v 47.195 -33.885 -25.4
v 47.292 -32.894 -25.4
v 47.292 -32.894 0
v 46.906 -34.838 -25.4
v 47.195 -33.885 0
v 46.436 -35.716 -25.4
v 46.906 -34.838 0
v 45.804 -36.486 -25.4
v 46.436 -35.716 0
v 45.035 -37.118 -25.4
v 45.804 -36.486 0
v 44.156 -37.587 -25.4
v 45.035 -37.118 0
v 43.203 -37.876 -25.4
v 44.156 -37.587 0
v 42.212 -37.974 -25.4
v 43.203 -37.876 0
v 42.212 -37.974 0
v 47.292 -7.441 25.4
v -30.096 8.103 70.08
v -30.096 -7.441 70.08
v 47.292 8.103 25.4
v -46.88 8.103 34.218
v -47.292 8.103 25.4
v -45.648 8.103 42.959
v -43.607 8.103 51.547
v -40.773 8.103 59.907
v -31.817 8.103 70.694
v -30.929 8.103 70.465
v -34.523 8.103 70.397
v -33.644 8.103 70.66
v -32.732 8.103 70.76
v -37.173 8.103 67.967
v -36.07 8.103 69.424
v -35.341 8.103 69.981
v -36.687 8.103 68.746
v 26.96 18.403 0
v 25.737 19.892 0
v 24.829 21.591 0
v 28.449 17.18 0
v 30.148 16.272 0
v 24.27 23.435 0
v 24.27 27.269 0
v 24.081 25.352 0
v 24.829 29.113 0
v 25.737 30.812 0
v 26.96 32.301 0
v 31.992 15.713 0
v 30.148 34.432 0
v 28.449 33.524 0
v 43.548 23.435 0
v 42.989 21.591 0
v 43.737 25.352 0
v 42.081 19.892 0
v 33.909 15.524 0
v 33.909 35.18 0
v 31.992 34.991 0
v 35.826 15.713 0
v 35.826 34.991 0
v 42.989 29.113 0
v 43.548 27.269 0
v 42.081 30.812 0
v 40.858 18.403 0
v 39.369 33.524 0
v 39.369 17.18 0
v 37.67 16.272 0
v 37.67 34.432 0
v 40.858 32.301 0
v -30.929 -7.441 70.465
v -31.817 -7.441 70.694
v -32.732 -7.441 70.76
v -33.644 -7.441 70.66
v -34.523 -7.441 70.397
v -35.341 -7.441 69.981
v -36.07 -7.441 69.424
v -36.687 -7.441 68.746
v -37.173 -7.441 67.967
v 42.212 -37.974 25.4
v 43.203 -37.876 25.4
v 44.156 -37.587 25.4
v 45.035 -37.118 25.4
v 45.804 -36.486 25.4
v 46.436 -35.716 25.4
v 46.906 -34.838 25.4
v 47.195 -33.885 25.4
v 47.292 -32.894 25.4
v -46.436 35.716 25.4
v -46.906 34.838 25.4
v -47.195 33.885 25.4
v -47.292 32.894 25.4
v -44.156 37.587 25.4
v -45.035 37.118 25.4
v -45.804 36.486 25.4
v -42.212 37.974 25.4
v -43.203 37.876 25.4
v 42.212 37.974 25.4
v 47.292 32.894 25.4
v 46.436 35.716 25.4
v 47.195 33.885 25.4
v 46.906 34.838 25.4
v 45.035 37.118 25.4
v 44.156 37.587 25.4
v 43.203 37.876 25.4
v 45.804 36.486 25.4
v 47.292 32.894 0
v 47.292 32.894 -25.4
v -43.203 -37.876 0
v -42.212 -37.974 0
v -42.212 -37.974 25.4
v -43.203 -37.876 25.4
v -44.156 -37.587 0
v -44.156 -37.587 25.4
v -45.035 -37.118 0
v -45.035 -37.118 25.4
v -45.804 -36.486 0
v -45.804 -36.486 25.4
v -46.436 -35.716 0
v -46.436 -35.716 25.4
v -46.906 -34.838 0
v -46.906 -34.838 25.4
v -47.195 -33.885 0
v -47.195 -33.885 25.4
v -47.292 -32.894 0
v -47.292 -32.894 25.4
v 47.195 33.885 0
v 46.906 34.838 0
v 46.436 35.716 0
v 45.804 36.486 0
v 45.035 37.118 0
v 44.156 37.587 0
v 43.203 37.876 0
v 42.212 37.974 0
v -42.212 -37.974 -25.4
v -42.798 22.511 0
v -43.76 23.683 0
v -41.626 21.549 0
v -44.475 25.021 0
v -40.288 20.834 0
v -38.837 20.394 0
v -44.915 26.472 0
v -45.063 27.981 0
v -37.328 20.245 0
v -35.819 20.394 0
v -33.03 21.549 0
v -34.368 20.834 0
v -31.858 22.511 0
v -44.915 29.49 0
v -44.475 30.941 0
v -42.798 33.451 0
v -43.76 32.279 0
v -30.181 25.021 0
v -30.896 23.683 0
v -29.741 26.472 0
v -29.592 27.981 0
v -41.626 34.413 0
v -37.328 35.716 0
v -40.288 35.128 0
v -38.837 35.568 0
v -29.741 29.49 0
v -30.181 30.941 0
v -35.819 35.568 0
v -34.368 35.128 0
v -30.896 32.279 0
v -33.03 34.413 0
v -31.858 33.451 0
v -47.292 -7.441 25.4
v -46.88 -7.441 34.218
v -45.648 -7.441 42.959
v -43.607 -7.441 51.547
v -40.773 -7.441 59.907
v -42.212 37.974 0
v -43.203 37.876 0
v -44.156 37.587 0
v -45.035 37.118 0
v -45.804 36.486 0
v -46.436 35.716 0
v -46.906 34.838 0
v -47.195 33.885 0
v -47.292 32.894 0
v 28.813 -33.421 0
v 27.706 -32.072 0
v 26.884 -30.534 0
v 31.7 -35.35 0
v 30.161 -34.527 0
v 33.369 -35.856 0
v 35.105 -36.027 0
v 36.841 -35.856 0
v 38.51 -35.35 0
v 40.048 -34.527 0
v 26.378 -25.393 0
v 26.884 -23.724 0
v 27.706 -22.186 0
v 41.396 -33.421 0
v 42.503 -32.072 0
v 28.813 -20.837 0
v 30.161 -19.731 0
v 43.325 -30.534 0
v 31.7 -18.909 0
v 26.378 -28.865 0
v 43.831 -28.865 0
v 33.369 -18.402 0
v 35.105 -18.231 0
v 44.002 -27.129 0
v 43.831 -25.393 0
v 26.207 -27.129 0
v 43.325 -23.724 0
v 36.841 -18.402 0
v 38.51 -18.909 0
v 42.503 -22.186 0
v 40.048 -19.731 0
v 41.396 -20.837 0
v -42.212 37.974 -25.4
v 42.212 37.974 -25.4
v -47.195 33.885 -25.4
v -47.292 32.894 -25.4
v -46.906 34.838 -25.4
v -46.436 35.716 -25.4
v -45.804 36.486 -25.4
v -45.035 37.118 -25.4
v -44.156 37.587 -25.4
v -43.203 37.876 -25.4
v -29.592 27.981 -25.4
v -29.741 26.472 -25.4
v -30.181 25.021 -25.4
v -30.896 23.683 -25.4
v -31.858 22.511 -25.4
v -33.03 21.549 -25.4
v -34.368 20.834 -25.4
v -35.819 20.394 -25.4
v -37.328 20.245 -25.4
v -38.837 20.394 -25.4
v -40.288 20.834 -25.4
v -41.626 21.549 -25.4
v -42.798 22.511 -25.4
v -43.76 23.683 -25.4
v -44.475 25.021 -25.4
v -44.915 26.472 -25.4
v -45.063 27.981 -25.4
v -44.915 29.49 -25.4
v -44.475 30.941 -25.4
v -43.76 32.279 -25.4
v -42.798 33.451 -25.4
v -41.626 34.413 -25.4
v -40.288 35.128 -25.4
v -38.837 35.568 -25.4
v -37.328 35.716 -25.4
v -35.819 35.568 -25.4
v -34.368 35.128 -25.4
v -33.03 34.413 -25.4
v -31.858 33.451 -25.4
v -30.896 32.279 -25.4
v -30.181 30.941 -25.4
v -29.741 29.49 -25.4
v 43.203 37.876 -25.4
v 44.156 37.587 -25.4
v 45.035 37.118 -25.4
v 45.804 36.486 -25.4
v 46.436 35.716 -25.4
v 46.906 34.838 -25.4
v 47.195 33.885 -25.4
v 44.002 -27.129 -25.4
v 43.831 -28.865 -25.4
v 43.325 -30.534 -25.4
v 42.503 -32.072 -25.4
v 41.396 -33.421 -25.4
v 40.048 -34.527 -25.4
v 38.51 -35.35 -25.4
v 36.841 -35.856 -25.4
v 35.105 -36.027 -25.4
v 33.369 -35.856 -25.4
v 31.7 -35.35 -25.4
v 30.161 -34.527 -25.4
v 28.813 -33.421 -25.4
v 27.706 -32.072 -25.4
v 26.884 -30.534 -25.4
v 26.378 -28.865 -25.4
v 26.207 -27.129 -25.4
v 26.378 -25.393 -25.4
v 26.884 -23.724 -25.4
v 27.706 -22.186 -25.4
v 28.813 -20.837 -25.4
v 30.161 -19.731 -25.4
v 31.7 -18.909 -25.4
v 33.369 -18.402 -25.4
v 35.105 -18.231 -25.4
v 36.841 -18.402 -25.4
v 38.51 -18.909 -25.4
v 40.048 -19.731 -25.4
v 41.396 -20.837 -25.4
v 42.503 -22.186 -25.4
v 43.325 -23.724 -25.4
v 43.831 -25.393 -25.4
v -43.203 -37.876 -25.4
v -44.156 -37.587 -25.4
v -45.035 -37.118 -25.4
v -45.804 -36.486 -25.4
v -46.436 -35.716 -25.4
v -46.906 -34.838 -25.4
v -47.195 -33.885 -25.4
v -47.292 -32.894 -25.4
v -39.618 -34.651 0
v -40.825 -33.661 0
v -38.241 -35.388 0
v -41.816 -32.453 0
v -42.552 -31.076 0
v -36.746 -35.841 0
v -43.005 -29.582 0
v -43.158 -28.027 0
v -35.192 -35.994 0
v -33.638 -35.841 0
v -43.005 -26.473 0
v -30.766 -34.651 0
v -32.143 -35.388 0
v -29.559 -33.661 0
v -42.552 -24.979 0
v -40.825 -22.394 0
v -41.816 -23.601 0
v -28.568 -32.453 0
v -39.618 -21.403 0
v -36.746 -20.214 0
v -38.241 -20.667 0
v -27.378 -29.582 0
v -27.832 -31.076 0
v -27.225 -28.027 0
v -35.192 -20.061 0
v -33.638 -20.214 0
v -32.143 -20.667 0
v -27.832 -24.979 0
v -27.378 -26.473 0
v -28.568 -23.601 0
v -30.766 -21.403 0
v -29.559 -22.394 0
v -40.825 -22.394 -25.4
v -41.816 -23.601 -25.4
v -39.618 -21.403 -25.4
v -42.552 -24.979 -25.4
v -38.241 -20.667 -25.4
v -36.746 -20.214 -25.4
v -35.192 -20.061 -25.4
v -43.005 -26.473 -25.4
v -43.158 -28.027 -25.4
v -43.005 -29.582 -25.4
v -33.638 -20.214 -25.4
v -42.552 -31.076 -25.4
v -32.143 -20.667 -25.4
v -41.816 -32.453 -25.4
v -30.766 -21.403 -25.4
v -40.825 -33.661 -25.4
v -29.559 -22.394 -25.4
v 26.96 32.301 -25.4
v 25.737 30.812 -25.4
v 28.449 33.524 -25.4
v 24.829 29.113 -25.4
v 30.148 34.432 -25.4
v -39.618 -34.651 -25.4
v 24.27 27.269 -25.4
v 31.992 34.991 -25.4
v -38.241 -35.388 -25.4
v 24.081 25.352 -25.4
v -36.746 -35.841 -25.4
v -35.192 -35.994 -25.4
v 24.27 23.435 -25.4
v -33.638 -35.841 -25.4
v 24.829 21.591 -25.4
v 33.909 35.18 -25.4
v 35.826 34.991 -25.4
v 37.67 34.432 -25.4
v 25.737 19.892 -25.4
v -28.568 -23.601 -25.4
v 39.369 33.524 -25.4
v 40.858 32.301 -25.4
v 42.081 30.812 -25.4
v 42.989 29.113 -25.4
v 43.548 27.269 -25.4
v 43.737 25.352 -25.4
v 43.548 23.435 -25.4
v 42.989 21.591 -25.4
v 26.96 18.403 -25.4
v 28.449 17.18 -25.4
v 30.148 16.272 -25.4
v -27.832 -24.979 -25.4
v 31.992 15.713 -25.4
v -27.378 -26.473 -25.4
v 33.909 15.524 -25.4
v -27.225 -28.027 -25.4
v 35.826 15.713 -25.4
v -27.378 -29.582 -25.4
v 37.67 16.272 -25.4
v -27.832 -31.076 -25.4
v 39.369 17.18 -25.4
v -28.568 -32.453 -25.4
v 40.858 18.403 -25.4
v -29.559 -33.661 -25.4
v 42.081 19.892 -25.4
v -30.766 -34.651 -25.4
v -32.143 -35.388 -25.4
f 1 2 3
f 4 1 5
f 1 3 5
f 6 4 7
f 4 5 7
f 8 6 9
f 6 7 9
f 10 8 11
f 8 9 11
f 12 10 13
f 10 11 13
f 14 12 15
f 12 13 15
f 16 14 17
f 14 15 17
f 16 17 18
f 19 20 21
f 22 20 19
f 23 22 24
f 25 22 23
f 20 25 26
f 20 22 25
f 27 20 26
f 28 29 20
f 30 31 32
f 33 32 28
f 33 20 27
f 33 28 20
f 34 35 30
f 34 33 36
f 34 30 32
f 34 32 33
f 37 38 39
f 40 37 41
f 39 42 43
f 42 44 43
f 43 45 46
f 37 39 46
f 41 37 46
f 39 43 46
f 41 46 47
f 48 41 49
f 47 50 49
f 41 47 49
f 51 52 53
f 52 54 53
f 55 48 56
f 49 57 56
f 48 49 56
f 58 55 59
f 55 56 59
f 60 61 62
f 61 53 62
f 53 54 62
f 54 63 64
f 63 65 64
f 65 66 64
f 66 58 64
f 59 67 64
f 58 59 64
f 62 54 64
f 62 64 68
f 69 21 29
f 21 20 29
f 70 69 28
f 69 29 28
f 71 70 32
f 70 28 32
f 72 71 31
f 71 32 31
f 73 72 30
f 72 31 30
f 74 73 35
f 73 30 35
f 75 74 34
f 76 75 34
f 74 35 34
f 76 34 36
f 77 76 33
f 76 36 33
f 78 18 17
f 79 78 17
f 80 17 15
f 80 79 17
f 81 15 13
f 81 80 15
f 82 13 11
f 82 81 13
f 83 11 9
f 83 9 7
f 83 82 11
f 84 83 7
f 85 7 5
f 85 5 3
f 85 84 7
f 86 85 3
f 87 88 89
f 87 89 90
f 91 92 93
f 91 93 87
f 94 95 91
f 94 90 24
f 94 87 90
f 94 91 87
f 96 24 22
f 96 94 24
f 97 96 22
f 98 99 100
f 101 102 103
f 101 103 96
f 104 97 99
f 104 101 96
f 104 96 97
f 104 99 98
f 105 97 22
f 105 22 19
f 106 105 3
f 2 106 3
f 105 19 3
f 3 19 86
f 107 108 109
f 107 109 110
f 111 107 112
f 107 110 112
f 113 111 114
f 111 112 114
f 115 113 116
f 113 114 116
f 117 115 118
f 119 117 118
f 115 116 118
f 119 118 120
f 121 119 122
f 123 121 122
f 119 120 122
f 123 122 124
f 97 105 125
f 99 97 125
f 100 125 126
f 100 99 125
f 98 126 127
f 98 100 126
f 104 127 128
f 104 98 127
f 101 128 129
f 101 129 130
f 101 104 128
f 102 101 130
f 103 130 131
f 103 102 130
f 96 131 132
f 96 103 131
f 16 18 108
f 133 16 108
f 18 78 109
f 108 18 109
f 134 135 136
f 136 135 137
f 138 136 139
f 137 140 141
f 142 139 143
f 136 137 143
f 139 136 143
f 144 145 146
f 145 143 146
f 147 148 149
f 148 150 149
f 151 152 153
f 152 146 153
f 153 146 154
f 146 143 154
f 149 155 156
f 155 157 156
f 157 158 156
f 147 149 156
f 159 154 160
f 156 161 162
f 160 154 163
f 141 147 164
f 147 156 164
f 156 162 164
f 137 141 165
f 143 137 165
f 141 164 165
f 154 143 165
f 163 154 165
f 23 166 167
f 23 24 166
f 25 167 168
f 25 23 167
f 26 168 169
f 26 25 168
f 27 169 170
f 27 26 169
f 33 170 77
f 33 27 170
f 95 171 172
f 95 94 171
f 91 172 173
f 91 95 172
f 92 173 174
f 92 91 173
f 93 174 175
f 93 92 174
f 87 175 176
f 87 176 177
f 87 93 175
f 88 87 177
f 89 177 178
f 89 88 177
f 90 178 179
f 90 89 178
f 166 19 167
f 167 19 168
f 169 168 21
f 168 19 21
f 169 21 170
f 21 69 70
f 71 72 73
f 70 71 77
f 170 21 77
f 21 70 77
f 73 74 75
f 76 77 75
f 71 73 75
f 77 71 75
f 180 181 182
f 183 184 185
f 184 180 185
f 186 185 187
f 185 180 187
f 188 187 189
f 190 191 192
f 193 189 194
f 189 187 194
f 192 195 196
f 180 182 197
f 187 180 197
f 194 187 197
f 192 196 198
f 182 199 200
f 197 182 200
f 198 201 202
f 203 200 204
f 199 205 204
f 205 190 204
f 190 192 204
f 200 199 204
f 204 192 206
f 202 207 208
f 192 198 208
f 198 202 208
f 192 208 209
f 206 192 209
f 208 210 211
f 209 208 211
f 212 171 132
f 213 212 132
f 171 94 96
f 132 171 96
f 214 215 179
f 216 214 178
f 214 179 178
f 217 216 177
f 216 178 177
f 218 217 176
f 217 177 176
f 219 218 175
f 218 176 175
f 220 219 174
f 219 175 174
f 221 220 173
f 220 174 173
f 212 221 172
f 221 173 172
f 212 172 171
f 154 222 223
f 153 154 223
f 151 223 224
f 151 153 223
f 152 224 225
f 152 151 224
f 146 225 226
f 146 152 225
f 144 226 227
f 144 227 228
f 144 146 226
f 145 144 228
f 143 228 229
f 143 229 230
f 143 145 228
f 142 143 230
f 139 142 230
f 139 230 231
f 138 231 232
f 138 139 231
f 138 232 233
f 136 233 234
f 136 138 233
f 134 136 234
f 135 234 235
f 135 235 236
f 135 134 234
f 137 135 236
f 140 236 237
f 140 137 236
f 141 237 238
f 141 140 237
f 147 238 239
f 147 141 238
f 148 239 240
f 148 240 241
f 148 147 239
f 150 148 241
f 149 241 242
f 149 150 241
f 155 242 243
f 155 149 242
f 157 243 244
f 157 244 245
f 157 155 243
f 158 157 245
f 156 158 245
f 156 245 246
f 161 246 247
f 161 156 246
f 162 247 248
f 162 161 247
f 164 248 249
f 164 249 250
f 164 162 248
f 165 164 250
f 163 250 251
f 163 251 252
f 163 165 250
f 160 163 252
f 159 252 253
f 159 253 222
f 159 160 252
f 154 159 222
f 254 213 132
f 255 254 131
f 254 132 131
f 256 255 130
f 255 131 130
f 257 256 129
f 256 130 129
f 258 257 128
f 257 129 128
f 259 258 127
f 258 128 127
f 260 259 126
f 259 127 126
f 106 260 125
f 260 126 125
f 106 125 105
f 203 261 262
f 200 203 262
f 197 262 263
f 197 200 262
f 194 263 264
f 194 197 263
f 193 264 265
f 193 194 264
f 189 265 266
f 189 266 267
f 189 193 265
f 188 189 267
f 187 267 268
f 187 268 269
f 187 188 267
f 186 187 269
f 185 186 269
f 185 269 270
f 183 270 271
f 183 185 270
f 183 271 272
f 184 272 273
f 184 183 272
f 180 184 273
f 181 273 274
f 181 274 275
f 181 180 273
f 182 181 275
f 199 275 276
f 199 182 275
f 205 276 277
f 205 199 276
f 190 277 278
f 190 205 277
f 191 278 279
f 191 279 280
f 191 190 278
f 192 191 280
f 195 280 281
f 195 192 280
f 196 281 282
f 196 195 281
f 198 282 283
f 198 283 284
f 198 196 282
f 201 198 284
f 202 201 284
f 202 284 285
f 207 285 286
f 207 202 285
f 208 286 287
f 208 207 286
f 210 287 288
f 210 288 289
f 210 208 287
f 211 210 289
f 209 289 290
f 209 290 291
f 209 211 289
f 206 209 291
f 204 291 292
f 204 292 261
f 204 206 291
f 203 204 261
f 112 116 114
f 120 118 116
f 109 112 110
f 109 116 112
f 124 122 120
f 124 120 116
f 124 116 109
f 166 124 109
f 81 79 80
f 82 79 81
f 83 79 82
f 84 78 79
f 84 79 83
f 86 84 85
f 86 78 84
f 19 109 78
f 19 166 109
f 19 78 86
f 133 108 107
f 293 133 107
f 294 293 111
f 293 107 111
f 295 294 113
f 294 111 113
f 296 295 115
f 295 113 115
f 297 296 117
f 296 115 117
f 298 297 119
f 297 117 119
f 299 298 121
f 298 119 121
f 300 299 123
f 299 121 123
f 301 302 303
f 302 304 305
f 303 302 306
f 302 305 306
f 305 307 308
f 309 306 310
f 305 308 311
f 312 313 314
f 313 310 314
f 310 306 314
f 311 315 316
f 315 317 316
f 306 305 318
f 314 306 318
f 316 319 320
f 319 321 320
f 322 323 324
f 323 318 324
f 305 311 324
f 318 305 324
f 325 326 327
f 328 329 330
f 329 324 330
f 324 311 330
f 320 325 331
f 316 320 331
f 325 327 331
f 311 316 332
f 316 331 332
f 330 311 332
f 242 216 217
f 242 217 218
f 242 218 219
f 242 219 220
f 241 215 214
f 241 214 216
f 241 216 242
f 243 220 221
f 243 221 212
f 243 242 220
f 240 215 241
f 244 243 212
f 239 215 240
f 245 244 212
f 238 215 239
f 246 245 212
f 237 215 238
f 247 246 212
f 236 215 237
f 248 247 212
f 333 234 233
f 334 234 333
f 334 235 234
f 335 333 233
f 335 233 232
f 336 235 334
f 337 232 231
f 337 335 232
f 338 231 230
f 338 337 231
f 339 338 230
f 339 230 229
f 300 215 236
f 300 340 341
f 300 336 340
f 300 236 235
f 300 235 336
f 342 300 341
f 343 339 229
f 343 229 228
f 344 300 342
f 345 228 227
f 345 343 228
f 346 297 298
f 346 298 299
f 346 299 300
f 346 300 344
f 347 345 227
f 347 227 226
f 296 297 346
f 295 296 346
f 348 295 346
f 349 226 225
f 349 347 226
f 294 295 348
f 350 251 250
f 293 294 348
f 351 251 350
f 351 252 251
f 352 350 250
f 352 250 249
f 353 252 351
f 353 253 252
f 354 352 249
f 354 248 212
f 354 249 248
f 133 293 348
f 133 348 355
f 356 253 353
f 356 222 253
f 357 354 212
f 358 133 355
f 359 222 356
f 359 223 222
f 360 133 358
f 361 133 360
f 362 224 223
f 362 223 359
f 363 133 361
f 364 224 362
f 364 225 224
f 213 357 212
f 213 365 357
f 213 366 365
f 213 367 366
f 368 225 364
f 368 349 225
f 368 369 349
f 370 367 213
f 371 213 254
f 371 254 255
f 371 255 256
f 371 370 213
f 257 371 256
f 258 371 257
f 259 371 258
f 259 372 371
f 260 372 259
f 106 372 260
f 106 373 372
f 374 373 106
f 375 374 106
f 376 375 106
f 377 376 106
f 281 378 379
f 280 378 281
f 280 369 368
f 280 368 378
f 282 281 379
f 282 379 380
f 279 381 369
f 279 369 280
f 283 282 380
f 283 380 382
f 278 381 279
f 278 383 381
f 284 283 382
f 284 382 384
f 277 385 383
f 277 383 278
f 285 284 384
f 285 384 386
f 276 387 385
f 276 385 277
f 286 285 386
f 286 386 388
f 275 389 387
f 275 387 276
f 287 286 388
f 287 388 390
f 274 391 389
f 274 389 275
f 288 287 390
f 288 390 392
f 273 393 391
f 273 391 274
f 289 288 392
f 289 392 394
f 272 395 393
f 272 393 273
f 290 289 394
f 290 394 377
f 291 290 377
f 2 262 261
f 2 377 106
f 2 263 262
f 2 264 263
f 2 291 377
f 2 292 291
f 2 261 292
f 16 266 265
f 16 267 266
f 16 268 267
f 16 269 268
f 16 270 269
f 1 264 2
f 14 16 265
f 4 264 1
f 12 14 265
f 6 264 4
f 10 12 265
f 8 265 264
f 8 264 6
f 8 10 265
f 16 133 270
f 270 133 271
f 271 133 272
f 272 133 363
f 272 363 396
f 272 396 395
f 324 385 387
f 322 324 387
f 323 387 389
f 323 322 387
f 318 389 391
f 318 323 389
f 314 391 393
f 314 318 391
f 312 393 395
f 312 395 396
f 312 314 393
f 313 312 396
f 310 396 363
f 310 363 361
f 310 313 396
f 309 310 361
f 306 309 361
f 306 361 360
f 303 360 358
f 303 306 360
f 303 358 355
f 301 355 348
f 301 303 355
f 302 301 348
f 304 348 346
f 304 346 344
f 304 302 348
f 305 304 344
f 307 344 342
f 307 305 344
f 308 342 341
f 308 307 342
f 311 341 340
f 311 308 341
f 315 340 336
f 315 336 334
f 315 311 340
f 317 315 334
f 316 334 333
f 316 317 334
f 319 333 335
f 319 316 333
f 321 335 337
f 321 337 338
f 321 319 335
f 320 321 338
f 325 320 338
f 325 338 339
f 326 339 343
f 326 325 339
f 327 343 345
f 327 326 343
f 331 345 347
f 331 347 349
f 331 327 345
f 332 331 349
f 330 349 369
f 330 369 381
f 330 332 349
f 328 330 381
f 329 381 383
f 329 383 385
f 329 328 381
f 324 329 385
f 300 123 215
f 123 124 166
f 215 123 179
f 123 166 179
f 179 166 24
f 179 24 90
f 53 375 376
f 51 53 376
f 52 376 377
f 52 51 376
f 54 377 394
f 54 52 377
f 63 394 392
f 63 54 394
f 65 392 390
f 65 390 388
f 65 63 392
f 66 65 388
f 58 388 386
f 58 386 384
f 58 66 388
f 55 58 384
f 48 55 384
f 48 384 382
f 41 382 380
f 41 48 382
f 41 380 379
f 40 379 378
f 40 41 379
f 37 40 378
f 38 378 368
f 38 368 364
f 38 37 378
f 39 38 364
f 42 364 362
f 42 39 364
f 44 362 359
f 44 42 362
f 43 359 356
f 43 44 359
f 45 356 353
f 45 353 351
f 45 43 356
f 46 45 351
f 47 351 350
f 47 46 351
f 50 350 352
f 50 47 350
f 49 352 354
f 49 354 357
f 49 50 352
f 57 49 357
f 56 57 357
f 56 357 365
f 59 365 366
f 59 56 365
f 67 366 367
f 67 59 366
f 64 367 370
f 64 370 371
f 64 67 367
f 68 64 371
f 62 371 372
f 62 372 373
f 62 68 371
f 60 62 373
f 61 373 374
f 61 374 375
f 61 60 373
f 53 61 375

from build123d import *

# Parameters (mm, degrees)
F0_W     = 94.5846885443
F0_H     = 28.4219961613
F0_H_2   = 24.2285877466
F0_H_3   = 23.2967082411
F1_DEPTH = 25.4
F2_W     = 94.5846885443
F2_H     = 15.5447232537
F3_ANGLE = 30
F4_R     = 5.08
F5_R     = 5.08
F6_R     = 5.08
F7_R     = 7.7354958654
F7_R_2   = 9.827935595
F7_R_3   = 7.966520615
F7_R_4   = 8.8977236071
F8_DEPTH = 25.4


with BuildPart() as f1:
    # F0 (on Top) → F1 (new body)
    with BuildSketch(Plane.XY):
        with Locations((0, 0.4659397528)):
            Rectangle(F0_W, F0_H)
        with Locations((0, -25.8593522012)):
            Rectangle(F0_W, F0_H_2)
        with Locations((0, 26.325291954)):
            Rectangle(F0_W, F0_H_3)
    extrude(amount=F1_DEPTH)

    # F2 (on face) → F3 (revolve)
    with BuildSketch(Plane.XY.offset(25.4)):
        with Locations((0, 0.3310537431)):
            Rectangle(F2_W, F2_H)
    revolve(axis=Axis((47.2923442721, 0.3310537431, 25.4), (0, 1, 0)), revolution_arc=F3_ANGLE)

    # F4
    f4_edges = [f1.edges().sort_by_distance(p)[0] for p in [
        (-47.292344, -37.973646, 12.7),
        (47.292344, -37.973646, 12.7),
    ]]
    fillet(f4_edges, radius=F4_R)

    # F5
    f5_edges = [f1.edges().sort_by_distance(p)[0] for p in [
        (47.292344, 37.973646, 12.7),
    ]]
    fillet(f5_edges, radius=F5_R)

    # F6
    f6_edges = [f1.edges().sort_by_distance(p)[0] for p in [
        (-47.292344, 37.973646, 12.7),
        (-34.620399, 0.331054, 72.692344),
    ]]
    fillet(f6_edges, radius=F6_R)

    # F7 (on face) → F8 (join)
    with BuildSketch(Plane(origin=(0, 0, 0), x_dir=(1, 0, 0), z_dir=(0, 0, -1))):
        with BuildLine():
            ThreePointArc((-47.2923442721, -32.8936460745), (-45.8044467206, -36.485748523), (-42.2123442721, -37.9736460745))
            Line((-42.2123442721, -37.9736460745), (42.2123442721, -37.9736460745))
            ThreePointArc((42.2123442721, -37.9736460745), (45.8044467206, -36.485748523), (47.2923442721, -32.8936460745))
            Line((47.2923442721, -32.8936460745), (47.2923442721, 32.8936460745))
            ThreePointArc((47.2923442721, 32.8936460745), (45.8044467206, 36.485748523), (42.2123442721, 37.9736460745))
            Line((42.2123442721, 37.9736460745), (-42.2123442721, 37.9736460745))
            ThreePointArc((-42.2123442721, 37.9736460745), (-45.8044467206, 36.485748523), (-47.2923442721, 32.8936460745))
            Line((-47.2923442721, 32.8936460745), (-47.2923442721, -32.8936460745))
        make_face()
        with Locations((-37.3279750347, -27.9809720814)):
            Circle(F7_R, mode=Mode.SUBTRACT)
        with Locations((33.9089371264, -25.3520905972)):
            Circle(F7_R_2, mode=Mode.SUBTRACT)
        with Locations((-35.1918712258, 28.0274003744)):
            Circle(F7_R_3, mode=Mode.SUBTRACT)
        with Locations((35.1046472788, 27.1290969104)):
            Circle(F7_R_4, mode=Mode.SUBTRACT)
    extrude(amount=F8_DEPTH)


solid = f1.part
